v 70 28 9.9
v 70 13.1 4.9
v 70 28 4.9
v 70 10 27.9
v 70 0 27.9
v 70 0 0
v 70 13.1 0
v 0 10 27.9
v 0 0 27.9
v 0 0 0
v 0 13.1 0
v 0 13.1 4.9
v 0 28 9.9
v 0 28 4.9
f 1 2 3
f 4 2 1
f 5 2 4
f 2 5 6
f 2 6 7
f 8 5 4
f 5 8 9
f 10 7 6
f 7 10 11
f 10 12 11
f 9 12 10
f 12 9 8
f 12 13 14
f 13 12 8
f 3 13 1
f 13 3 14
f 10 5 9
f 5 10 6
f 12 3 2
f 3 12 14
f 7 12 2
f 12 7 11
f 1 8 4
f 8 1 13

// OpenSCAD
inner_thickness=3;
z=27.9;
x=70;
y=28;

difference(){
cube([x,y,z]);
color("red")
translate([-.1,.1+y-inner_thickness*5,-.1])
cube([x+.2,inner_thickness*5,inner_thickness+2]);
    translate([0,10,z])
rotate([-45,0,0])
color("green")
cube([x,y,z]);
}
